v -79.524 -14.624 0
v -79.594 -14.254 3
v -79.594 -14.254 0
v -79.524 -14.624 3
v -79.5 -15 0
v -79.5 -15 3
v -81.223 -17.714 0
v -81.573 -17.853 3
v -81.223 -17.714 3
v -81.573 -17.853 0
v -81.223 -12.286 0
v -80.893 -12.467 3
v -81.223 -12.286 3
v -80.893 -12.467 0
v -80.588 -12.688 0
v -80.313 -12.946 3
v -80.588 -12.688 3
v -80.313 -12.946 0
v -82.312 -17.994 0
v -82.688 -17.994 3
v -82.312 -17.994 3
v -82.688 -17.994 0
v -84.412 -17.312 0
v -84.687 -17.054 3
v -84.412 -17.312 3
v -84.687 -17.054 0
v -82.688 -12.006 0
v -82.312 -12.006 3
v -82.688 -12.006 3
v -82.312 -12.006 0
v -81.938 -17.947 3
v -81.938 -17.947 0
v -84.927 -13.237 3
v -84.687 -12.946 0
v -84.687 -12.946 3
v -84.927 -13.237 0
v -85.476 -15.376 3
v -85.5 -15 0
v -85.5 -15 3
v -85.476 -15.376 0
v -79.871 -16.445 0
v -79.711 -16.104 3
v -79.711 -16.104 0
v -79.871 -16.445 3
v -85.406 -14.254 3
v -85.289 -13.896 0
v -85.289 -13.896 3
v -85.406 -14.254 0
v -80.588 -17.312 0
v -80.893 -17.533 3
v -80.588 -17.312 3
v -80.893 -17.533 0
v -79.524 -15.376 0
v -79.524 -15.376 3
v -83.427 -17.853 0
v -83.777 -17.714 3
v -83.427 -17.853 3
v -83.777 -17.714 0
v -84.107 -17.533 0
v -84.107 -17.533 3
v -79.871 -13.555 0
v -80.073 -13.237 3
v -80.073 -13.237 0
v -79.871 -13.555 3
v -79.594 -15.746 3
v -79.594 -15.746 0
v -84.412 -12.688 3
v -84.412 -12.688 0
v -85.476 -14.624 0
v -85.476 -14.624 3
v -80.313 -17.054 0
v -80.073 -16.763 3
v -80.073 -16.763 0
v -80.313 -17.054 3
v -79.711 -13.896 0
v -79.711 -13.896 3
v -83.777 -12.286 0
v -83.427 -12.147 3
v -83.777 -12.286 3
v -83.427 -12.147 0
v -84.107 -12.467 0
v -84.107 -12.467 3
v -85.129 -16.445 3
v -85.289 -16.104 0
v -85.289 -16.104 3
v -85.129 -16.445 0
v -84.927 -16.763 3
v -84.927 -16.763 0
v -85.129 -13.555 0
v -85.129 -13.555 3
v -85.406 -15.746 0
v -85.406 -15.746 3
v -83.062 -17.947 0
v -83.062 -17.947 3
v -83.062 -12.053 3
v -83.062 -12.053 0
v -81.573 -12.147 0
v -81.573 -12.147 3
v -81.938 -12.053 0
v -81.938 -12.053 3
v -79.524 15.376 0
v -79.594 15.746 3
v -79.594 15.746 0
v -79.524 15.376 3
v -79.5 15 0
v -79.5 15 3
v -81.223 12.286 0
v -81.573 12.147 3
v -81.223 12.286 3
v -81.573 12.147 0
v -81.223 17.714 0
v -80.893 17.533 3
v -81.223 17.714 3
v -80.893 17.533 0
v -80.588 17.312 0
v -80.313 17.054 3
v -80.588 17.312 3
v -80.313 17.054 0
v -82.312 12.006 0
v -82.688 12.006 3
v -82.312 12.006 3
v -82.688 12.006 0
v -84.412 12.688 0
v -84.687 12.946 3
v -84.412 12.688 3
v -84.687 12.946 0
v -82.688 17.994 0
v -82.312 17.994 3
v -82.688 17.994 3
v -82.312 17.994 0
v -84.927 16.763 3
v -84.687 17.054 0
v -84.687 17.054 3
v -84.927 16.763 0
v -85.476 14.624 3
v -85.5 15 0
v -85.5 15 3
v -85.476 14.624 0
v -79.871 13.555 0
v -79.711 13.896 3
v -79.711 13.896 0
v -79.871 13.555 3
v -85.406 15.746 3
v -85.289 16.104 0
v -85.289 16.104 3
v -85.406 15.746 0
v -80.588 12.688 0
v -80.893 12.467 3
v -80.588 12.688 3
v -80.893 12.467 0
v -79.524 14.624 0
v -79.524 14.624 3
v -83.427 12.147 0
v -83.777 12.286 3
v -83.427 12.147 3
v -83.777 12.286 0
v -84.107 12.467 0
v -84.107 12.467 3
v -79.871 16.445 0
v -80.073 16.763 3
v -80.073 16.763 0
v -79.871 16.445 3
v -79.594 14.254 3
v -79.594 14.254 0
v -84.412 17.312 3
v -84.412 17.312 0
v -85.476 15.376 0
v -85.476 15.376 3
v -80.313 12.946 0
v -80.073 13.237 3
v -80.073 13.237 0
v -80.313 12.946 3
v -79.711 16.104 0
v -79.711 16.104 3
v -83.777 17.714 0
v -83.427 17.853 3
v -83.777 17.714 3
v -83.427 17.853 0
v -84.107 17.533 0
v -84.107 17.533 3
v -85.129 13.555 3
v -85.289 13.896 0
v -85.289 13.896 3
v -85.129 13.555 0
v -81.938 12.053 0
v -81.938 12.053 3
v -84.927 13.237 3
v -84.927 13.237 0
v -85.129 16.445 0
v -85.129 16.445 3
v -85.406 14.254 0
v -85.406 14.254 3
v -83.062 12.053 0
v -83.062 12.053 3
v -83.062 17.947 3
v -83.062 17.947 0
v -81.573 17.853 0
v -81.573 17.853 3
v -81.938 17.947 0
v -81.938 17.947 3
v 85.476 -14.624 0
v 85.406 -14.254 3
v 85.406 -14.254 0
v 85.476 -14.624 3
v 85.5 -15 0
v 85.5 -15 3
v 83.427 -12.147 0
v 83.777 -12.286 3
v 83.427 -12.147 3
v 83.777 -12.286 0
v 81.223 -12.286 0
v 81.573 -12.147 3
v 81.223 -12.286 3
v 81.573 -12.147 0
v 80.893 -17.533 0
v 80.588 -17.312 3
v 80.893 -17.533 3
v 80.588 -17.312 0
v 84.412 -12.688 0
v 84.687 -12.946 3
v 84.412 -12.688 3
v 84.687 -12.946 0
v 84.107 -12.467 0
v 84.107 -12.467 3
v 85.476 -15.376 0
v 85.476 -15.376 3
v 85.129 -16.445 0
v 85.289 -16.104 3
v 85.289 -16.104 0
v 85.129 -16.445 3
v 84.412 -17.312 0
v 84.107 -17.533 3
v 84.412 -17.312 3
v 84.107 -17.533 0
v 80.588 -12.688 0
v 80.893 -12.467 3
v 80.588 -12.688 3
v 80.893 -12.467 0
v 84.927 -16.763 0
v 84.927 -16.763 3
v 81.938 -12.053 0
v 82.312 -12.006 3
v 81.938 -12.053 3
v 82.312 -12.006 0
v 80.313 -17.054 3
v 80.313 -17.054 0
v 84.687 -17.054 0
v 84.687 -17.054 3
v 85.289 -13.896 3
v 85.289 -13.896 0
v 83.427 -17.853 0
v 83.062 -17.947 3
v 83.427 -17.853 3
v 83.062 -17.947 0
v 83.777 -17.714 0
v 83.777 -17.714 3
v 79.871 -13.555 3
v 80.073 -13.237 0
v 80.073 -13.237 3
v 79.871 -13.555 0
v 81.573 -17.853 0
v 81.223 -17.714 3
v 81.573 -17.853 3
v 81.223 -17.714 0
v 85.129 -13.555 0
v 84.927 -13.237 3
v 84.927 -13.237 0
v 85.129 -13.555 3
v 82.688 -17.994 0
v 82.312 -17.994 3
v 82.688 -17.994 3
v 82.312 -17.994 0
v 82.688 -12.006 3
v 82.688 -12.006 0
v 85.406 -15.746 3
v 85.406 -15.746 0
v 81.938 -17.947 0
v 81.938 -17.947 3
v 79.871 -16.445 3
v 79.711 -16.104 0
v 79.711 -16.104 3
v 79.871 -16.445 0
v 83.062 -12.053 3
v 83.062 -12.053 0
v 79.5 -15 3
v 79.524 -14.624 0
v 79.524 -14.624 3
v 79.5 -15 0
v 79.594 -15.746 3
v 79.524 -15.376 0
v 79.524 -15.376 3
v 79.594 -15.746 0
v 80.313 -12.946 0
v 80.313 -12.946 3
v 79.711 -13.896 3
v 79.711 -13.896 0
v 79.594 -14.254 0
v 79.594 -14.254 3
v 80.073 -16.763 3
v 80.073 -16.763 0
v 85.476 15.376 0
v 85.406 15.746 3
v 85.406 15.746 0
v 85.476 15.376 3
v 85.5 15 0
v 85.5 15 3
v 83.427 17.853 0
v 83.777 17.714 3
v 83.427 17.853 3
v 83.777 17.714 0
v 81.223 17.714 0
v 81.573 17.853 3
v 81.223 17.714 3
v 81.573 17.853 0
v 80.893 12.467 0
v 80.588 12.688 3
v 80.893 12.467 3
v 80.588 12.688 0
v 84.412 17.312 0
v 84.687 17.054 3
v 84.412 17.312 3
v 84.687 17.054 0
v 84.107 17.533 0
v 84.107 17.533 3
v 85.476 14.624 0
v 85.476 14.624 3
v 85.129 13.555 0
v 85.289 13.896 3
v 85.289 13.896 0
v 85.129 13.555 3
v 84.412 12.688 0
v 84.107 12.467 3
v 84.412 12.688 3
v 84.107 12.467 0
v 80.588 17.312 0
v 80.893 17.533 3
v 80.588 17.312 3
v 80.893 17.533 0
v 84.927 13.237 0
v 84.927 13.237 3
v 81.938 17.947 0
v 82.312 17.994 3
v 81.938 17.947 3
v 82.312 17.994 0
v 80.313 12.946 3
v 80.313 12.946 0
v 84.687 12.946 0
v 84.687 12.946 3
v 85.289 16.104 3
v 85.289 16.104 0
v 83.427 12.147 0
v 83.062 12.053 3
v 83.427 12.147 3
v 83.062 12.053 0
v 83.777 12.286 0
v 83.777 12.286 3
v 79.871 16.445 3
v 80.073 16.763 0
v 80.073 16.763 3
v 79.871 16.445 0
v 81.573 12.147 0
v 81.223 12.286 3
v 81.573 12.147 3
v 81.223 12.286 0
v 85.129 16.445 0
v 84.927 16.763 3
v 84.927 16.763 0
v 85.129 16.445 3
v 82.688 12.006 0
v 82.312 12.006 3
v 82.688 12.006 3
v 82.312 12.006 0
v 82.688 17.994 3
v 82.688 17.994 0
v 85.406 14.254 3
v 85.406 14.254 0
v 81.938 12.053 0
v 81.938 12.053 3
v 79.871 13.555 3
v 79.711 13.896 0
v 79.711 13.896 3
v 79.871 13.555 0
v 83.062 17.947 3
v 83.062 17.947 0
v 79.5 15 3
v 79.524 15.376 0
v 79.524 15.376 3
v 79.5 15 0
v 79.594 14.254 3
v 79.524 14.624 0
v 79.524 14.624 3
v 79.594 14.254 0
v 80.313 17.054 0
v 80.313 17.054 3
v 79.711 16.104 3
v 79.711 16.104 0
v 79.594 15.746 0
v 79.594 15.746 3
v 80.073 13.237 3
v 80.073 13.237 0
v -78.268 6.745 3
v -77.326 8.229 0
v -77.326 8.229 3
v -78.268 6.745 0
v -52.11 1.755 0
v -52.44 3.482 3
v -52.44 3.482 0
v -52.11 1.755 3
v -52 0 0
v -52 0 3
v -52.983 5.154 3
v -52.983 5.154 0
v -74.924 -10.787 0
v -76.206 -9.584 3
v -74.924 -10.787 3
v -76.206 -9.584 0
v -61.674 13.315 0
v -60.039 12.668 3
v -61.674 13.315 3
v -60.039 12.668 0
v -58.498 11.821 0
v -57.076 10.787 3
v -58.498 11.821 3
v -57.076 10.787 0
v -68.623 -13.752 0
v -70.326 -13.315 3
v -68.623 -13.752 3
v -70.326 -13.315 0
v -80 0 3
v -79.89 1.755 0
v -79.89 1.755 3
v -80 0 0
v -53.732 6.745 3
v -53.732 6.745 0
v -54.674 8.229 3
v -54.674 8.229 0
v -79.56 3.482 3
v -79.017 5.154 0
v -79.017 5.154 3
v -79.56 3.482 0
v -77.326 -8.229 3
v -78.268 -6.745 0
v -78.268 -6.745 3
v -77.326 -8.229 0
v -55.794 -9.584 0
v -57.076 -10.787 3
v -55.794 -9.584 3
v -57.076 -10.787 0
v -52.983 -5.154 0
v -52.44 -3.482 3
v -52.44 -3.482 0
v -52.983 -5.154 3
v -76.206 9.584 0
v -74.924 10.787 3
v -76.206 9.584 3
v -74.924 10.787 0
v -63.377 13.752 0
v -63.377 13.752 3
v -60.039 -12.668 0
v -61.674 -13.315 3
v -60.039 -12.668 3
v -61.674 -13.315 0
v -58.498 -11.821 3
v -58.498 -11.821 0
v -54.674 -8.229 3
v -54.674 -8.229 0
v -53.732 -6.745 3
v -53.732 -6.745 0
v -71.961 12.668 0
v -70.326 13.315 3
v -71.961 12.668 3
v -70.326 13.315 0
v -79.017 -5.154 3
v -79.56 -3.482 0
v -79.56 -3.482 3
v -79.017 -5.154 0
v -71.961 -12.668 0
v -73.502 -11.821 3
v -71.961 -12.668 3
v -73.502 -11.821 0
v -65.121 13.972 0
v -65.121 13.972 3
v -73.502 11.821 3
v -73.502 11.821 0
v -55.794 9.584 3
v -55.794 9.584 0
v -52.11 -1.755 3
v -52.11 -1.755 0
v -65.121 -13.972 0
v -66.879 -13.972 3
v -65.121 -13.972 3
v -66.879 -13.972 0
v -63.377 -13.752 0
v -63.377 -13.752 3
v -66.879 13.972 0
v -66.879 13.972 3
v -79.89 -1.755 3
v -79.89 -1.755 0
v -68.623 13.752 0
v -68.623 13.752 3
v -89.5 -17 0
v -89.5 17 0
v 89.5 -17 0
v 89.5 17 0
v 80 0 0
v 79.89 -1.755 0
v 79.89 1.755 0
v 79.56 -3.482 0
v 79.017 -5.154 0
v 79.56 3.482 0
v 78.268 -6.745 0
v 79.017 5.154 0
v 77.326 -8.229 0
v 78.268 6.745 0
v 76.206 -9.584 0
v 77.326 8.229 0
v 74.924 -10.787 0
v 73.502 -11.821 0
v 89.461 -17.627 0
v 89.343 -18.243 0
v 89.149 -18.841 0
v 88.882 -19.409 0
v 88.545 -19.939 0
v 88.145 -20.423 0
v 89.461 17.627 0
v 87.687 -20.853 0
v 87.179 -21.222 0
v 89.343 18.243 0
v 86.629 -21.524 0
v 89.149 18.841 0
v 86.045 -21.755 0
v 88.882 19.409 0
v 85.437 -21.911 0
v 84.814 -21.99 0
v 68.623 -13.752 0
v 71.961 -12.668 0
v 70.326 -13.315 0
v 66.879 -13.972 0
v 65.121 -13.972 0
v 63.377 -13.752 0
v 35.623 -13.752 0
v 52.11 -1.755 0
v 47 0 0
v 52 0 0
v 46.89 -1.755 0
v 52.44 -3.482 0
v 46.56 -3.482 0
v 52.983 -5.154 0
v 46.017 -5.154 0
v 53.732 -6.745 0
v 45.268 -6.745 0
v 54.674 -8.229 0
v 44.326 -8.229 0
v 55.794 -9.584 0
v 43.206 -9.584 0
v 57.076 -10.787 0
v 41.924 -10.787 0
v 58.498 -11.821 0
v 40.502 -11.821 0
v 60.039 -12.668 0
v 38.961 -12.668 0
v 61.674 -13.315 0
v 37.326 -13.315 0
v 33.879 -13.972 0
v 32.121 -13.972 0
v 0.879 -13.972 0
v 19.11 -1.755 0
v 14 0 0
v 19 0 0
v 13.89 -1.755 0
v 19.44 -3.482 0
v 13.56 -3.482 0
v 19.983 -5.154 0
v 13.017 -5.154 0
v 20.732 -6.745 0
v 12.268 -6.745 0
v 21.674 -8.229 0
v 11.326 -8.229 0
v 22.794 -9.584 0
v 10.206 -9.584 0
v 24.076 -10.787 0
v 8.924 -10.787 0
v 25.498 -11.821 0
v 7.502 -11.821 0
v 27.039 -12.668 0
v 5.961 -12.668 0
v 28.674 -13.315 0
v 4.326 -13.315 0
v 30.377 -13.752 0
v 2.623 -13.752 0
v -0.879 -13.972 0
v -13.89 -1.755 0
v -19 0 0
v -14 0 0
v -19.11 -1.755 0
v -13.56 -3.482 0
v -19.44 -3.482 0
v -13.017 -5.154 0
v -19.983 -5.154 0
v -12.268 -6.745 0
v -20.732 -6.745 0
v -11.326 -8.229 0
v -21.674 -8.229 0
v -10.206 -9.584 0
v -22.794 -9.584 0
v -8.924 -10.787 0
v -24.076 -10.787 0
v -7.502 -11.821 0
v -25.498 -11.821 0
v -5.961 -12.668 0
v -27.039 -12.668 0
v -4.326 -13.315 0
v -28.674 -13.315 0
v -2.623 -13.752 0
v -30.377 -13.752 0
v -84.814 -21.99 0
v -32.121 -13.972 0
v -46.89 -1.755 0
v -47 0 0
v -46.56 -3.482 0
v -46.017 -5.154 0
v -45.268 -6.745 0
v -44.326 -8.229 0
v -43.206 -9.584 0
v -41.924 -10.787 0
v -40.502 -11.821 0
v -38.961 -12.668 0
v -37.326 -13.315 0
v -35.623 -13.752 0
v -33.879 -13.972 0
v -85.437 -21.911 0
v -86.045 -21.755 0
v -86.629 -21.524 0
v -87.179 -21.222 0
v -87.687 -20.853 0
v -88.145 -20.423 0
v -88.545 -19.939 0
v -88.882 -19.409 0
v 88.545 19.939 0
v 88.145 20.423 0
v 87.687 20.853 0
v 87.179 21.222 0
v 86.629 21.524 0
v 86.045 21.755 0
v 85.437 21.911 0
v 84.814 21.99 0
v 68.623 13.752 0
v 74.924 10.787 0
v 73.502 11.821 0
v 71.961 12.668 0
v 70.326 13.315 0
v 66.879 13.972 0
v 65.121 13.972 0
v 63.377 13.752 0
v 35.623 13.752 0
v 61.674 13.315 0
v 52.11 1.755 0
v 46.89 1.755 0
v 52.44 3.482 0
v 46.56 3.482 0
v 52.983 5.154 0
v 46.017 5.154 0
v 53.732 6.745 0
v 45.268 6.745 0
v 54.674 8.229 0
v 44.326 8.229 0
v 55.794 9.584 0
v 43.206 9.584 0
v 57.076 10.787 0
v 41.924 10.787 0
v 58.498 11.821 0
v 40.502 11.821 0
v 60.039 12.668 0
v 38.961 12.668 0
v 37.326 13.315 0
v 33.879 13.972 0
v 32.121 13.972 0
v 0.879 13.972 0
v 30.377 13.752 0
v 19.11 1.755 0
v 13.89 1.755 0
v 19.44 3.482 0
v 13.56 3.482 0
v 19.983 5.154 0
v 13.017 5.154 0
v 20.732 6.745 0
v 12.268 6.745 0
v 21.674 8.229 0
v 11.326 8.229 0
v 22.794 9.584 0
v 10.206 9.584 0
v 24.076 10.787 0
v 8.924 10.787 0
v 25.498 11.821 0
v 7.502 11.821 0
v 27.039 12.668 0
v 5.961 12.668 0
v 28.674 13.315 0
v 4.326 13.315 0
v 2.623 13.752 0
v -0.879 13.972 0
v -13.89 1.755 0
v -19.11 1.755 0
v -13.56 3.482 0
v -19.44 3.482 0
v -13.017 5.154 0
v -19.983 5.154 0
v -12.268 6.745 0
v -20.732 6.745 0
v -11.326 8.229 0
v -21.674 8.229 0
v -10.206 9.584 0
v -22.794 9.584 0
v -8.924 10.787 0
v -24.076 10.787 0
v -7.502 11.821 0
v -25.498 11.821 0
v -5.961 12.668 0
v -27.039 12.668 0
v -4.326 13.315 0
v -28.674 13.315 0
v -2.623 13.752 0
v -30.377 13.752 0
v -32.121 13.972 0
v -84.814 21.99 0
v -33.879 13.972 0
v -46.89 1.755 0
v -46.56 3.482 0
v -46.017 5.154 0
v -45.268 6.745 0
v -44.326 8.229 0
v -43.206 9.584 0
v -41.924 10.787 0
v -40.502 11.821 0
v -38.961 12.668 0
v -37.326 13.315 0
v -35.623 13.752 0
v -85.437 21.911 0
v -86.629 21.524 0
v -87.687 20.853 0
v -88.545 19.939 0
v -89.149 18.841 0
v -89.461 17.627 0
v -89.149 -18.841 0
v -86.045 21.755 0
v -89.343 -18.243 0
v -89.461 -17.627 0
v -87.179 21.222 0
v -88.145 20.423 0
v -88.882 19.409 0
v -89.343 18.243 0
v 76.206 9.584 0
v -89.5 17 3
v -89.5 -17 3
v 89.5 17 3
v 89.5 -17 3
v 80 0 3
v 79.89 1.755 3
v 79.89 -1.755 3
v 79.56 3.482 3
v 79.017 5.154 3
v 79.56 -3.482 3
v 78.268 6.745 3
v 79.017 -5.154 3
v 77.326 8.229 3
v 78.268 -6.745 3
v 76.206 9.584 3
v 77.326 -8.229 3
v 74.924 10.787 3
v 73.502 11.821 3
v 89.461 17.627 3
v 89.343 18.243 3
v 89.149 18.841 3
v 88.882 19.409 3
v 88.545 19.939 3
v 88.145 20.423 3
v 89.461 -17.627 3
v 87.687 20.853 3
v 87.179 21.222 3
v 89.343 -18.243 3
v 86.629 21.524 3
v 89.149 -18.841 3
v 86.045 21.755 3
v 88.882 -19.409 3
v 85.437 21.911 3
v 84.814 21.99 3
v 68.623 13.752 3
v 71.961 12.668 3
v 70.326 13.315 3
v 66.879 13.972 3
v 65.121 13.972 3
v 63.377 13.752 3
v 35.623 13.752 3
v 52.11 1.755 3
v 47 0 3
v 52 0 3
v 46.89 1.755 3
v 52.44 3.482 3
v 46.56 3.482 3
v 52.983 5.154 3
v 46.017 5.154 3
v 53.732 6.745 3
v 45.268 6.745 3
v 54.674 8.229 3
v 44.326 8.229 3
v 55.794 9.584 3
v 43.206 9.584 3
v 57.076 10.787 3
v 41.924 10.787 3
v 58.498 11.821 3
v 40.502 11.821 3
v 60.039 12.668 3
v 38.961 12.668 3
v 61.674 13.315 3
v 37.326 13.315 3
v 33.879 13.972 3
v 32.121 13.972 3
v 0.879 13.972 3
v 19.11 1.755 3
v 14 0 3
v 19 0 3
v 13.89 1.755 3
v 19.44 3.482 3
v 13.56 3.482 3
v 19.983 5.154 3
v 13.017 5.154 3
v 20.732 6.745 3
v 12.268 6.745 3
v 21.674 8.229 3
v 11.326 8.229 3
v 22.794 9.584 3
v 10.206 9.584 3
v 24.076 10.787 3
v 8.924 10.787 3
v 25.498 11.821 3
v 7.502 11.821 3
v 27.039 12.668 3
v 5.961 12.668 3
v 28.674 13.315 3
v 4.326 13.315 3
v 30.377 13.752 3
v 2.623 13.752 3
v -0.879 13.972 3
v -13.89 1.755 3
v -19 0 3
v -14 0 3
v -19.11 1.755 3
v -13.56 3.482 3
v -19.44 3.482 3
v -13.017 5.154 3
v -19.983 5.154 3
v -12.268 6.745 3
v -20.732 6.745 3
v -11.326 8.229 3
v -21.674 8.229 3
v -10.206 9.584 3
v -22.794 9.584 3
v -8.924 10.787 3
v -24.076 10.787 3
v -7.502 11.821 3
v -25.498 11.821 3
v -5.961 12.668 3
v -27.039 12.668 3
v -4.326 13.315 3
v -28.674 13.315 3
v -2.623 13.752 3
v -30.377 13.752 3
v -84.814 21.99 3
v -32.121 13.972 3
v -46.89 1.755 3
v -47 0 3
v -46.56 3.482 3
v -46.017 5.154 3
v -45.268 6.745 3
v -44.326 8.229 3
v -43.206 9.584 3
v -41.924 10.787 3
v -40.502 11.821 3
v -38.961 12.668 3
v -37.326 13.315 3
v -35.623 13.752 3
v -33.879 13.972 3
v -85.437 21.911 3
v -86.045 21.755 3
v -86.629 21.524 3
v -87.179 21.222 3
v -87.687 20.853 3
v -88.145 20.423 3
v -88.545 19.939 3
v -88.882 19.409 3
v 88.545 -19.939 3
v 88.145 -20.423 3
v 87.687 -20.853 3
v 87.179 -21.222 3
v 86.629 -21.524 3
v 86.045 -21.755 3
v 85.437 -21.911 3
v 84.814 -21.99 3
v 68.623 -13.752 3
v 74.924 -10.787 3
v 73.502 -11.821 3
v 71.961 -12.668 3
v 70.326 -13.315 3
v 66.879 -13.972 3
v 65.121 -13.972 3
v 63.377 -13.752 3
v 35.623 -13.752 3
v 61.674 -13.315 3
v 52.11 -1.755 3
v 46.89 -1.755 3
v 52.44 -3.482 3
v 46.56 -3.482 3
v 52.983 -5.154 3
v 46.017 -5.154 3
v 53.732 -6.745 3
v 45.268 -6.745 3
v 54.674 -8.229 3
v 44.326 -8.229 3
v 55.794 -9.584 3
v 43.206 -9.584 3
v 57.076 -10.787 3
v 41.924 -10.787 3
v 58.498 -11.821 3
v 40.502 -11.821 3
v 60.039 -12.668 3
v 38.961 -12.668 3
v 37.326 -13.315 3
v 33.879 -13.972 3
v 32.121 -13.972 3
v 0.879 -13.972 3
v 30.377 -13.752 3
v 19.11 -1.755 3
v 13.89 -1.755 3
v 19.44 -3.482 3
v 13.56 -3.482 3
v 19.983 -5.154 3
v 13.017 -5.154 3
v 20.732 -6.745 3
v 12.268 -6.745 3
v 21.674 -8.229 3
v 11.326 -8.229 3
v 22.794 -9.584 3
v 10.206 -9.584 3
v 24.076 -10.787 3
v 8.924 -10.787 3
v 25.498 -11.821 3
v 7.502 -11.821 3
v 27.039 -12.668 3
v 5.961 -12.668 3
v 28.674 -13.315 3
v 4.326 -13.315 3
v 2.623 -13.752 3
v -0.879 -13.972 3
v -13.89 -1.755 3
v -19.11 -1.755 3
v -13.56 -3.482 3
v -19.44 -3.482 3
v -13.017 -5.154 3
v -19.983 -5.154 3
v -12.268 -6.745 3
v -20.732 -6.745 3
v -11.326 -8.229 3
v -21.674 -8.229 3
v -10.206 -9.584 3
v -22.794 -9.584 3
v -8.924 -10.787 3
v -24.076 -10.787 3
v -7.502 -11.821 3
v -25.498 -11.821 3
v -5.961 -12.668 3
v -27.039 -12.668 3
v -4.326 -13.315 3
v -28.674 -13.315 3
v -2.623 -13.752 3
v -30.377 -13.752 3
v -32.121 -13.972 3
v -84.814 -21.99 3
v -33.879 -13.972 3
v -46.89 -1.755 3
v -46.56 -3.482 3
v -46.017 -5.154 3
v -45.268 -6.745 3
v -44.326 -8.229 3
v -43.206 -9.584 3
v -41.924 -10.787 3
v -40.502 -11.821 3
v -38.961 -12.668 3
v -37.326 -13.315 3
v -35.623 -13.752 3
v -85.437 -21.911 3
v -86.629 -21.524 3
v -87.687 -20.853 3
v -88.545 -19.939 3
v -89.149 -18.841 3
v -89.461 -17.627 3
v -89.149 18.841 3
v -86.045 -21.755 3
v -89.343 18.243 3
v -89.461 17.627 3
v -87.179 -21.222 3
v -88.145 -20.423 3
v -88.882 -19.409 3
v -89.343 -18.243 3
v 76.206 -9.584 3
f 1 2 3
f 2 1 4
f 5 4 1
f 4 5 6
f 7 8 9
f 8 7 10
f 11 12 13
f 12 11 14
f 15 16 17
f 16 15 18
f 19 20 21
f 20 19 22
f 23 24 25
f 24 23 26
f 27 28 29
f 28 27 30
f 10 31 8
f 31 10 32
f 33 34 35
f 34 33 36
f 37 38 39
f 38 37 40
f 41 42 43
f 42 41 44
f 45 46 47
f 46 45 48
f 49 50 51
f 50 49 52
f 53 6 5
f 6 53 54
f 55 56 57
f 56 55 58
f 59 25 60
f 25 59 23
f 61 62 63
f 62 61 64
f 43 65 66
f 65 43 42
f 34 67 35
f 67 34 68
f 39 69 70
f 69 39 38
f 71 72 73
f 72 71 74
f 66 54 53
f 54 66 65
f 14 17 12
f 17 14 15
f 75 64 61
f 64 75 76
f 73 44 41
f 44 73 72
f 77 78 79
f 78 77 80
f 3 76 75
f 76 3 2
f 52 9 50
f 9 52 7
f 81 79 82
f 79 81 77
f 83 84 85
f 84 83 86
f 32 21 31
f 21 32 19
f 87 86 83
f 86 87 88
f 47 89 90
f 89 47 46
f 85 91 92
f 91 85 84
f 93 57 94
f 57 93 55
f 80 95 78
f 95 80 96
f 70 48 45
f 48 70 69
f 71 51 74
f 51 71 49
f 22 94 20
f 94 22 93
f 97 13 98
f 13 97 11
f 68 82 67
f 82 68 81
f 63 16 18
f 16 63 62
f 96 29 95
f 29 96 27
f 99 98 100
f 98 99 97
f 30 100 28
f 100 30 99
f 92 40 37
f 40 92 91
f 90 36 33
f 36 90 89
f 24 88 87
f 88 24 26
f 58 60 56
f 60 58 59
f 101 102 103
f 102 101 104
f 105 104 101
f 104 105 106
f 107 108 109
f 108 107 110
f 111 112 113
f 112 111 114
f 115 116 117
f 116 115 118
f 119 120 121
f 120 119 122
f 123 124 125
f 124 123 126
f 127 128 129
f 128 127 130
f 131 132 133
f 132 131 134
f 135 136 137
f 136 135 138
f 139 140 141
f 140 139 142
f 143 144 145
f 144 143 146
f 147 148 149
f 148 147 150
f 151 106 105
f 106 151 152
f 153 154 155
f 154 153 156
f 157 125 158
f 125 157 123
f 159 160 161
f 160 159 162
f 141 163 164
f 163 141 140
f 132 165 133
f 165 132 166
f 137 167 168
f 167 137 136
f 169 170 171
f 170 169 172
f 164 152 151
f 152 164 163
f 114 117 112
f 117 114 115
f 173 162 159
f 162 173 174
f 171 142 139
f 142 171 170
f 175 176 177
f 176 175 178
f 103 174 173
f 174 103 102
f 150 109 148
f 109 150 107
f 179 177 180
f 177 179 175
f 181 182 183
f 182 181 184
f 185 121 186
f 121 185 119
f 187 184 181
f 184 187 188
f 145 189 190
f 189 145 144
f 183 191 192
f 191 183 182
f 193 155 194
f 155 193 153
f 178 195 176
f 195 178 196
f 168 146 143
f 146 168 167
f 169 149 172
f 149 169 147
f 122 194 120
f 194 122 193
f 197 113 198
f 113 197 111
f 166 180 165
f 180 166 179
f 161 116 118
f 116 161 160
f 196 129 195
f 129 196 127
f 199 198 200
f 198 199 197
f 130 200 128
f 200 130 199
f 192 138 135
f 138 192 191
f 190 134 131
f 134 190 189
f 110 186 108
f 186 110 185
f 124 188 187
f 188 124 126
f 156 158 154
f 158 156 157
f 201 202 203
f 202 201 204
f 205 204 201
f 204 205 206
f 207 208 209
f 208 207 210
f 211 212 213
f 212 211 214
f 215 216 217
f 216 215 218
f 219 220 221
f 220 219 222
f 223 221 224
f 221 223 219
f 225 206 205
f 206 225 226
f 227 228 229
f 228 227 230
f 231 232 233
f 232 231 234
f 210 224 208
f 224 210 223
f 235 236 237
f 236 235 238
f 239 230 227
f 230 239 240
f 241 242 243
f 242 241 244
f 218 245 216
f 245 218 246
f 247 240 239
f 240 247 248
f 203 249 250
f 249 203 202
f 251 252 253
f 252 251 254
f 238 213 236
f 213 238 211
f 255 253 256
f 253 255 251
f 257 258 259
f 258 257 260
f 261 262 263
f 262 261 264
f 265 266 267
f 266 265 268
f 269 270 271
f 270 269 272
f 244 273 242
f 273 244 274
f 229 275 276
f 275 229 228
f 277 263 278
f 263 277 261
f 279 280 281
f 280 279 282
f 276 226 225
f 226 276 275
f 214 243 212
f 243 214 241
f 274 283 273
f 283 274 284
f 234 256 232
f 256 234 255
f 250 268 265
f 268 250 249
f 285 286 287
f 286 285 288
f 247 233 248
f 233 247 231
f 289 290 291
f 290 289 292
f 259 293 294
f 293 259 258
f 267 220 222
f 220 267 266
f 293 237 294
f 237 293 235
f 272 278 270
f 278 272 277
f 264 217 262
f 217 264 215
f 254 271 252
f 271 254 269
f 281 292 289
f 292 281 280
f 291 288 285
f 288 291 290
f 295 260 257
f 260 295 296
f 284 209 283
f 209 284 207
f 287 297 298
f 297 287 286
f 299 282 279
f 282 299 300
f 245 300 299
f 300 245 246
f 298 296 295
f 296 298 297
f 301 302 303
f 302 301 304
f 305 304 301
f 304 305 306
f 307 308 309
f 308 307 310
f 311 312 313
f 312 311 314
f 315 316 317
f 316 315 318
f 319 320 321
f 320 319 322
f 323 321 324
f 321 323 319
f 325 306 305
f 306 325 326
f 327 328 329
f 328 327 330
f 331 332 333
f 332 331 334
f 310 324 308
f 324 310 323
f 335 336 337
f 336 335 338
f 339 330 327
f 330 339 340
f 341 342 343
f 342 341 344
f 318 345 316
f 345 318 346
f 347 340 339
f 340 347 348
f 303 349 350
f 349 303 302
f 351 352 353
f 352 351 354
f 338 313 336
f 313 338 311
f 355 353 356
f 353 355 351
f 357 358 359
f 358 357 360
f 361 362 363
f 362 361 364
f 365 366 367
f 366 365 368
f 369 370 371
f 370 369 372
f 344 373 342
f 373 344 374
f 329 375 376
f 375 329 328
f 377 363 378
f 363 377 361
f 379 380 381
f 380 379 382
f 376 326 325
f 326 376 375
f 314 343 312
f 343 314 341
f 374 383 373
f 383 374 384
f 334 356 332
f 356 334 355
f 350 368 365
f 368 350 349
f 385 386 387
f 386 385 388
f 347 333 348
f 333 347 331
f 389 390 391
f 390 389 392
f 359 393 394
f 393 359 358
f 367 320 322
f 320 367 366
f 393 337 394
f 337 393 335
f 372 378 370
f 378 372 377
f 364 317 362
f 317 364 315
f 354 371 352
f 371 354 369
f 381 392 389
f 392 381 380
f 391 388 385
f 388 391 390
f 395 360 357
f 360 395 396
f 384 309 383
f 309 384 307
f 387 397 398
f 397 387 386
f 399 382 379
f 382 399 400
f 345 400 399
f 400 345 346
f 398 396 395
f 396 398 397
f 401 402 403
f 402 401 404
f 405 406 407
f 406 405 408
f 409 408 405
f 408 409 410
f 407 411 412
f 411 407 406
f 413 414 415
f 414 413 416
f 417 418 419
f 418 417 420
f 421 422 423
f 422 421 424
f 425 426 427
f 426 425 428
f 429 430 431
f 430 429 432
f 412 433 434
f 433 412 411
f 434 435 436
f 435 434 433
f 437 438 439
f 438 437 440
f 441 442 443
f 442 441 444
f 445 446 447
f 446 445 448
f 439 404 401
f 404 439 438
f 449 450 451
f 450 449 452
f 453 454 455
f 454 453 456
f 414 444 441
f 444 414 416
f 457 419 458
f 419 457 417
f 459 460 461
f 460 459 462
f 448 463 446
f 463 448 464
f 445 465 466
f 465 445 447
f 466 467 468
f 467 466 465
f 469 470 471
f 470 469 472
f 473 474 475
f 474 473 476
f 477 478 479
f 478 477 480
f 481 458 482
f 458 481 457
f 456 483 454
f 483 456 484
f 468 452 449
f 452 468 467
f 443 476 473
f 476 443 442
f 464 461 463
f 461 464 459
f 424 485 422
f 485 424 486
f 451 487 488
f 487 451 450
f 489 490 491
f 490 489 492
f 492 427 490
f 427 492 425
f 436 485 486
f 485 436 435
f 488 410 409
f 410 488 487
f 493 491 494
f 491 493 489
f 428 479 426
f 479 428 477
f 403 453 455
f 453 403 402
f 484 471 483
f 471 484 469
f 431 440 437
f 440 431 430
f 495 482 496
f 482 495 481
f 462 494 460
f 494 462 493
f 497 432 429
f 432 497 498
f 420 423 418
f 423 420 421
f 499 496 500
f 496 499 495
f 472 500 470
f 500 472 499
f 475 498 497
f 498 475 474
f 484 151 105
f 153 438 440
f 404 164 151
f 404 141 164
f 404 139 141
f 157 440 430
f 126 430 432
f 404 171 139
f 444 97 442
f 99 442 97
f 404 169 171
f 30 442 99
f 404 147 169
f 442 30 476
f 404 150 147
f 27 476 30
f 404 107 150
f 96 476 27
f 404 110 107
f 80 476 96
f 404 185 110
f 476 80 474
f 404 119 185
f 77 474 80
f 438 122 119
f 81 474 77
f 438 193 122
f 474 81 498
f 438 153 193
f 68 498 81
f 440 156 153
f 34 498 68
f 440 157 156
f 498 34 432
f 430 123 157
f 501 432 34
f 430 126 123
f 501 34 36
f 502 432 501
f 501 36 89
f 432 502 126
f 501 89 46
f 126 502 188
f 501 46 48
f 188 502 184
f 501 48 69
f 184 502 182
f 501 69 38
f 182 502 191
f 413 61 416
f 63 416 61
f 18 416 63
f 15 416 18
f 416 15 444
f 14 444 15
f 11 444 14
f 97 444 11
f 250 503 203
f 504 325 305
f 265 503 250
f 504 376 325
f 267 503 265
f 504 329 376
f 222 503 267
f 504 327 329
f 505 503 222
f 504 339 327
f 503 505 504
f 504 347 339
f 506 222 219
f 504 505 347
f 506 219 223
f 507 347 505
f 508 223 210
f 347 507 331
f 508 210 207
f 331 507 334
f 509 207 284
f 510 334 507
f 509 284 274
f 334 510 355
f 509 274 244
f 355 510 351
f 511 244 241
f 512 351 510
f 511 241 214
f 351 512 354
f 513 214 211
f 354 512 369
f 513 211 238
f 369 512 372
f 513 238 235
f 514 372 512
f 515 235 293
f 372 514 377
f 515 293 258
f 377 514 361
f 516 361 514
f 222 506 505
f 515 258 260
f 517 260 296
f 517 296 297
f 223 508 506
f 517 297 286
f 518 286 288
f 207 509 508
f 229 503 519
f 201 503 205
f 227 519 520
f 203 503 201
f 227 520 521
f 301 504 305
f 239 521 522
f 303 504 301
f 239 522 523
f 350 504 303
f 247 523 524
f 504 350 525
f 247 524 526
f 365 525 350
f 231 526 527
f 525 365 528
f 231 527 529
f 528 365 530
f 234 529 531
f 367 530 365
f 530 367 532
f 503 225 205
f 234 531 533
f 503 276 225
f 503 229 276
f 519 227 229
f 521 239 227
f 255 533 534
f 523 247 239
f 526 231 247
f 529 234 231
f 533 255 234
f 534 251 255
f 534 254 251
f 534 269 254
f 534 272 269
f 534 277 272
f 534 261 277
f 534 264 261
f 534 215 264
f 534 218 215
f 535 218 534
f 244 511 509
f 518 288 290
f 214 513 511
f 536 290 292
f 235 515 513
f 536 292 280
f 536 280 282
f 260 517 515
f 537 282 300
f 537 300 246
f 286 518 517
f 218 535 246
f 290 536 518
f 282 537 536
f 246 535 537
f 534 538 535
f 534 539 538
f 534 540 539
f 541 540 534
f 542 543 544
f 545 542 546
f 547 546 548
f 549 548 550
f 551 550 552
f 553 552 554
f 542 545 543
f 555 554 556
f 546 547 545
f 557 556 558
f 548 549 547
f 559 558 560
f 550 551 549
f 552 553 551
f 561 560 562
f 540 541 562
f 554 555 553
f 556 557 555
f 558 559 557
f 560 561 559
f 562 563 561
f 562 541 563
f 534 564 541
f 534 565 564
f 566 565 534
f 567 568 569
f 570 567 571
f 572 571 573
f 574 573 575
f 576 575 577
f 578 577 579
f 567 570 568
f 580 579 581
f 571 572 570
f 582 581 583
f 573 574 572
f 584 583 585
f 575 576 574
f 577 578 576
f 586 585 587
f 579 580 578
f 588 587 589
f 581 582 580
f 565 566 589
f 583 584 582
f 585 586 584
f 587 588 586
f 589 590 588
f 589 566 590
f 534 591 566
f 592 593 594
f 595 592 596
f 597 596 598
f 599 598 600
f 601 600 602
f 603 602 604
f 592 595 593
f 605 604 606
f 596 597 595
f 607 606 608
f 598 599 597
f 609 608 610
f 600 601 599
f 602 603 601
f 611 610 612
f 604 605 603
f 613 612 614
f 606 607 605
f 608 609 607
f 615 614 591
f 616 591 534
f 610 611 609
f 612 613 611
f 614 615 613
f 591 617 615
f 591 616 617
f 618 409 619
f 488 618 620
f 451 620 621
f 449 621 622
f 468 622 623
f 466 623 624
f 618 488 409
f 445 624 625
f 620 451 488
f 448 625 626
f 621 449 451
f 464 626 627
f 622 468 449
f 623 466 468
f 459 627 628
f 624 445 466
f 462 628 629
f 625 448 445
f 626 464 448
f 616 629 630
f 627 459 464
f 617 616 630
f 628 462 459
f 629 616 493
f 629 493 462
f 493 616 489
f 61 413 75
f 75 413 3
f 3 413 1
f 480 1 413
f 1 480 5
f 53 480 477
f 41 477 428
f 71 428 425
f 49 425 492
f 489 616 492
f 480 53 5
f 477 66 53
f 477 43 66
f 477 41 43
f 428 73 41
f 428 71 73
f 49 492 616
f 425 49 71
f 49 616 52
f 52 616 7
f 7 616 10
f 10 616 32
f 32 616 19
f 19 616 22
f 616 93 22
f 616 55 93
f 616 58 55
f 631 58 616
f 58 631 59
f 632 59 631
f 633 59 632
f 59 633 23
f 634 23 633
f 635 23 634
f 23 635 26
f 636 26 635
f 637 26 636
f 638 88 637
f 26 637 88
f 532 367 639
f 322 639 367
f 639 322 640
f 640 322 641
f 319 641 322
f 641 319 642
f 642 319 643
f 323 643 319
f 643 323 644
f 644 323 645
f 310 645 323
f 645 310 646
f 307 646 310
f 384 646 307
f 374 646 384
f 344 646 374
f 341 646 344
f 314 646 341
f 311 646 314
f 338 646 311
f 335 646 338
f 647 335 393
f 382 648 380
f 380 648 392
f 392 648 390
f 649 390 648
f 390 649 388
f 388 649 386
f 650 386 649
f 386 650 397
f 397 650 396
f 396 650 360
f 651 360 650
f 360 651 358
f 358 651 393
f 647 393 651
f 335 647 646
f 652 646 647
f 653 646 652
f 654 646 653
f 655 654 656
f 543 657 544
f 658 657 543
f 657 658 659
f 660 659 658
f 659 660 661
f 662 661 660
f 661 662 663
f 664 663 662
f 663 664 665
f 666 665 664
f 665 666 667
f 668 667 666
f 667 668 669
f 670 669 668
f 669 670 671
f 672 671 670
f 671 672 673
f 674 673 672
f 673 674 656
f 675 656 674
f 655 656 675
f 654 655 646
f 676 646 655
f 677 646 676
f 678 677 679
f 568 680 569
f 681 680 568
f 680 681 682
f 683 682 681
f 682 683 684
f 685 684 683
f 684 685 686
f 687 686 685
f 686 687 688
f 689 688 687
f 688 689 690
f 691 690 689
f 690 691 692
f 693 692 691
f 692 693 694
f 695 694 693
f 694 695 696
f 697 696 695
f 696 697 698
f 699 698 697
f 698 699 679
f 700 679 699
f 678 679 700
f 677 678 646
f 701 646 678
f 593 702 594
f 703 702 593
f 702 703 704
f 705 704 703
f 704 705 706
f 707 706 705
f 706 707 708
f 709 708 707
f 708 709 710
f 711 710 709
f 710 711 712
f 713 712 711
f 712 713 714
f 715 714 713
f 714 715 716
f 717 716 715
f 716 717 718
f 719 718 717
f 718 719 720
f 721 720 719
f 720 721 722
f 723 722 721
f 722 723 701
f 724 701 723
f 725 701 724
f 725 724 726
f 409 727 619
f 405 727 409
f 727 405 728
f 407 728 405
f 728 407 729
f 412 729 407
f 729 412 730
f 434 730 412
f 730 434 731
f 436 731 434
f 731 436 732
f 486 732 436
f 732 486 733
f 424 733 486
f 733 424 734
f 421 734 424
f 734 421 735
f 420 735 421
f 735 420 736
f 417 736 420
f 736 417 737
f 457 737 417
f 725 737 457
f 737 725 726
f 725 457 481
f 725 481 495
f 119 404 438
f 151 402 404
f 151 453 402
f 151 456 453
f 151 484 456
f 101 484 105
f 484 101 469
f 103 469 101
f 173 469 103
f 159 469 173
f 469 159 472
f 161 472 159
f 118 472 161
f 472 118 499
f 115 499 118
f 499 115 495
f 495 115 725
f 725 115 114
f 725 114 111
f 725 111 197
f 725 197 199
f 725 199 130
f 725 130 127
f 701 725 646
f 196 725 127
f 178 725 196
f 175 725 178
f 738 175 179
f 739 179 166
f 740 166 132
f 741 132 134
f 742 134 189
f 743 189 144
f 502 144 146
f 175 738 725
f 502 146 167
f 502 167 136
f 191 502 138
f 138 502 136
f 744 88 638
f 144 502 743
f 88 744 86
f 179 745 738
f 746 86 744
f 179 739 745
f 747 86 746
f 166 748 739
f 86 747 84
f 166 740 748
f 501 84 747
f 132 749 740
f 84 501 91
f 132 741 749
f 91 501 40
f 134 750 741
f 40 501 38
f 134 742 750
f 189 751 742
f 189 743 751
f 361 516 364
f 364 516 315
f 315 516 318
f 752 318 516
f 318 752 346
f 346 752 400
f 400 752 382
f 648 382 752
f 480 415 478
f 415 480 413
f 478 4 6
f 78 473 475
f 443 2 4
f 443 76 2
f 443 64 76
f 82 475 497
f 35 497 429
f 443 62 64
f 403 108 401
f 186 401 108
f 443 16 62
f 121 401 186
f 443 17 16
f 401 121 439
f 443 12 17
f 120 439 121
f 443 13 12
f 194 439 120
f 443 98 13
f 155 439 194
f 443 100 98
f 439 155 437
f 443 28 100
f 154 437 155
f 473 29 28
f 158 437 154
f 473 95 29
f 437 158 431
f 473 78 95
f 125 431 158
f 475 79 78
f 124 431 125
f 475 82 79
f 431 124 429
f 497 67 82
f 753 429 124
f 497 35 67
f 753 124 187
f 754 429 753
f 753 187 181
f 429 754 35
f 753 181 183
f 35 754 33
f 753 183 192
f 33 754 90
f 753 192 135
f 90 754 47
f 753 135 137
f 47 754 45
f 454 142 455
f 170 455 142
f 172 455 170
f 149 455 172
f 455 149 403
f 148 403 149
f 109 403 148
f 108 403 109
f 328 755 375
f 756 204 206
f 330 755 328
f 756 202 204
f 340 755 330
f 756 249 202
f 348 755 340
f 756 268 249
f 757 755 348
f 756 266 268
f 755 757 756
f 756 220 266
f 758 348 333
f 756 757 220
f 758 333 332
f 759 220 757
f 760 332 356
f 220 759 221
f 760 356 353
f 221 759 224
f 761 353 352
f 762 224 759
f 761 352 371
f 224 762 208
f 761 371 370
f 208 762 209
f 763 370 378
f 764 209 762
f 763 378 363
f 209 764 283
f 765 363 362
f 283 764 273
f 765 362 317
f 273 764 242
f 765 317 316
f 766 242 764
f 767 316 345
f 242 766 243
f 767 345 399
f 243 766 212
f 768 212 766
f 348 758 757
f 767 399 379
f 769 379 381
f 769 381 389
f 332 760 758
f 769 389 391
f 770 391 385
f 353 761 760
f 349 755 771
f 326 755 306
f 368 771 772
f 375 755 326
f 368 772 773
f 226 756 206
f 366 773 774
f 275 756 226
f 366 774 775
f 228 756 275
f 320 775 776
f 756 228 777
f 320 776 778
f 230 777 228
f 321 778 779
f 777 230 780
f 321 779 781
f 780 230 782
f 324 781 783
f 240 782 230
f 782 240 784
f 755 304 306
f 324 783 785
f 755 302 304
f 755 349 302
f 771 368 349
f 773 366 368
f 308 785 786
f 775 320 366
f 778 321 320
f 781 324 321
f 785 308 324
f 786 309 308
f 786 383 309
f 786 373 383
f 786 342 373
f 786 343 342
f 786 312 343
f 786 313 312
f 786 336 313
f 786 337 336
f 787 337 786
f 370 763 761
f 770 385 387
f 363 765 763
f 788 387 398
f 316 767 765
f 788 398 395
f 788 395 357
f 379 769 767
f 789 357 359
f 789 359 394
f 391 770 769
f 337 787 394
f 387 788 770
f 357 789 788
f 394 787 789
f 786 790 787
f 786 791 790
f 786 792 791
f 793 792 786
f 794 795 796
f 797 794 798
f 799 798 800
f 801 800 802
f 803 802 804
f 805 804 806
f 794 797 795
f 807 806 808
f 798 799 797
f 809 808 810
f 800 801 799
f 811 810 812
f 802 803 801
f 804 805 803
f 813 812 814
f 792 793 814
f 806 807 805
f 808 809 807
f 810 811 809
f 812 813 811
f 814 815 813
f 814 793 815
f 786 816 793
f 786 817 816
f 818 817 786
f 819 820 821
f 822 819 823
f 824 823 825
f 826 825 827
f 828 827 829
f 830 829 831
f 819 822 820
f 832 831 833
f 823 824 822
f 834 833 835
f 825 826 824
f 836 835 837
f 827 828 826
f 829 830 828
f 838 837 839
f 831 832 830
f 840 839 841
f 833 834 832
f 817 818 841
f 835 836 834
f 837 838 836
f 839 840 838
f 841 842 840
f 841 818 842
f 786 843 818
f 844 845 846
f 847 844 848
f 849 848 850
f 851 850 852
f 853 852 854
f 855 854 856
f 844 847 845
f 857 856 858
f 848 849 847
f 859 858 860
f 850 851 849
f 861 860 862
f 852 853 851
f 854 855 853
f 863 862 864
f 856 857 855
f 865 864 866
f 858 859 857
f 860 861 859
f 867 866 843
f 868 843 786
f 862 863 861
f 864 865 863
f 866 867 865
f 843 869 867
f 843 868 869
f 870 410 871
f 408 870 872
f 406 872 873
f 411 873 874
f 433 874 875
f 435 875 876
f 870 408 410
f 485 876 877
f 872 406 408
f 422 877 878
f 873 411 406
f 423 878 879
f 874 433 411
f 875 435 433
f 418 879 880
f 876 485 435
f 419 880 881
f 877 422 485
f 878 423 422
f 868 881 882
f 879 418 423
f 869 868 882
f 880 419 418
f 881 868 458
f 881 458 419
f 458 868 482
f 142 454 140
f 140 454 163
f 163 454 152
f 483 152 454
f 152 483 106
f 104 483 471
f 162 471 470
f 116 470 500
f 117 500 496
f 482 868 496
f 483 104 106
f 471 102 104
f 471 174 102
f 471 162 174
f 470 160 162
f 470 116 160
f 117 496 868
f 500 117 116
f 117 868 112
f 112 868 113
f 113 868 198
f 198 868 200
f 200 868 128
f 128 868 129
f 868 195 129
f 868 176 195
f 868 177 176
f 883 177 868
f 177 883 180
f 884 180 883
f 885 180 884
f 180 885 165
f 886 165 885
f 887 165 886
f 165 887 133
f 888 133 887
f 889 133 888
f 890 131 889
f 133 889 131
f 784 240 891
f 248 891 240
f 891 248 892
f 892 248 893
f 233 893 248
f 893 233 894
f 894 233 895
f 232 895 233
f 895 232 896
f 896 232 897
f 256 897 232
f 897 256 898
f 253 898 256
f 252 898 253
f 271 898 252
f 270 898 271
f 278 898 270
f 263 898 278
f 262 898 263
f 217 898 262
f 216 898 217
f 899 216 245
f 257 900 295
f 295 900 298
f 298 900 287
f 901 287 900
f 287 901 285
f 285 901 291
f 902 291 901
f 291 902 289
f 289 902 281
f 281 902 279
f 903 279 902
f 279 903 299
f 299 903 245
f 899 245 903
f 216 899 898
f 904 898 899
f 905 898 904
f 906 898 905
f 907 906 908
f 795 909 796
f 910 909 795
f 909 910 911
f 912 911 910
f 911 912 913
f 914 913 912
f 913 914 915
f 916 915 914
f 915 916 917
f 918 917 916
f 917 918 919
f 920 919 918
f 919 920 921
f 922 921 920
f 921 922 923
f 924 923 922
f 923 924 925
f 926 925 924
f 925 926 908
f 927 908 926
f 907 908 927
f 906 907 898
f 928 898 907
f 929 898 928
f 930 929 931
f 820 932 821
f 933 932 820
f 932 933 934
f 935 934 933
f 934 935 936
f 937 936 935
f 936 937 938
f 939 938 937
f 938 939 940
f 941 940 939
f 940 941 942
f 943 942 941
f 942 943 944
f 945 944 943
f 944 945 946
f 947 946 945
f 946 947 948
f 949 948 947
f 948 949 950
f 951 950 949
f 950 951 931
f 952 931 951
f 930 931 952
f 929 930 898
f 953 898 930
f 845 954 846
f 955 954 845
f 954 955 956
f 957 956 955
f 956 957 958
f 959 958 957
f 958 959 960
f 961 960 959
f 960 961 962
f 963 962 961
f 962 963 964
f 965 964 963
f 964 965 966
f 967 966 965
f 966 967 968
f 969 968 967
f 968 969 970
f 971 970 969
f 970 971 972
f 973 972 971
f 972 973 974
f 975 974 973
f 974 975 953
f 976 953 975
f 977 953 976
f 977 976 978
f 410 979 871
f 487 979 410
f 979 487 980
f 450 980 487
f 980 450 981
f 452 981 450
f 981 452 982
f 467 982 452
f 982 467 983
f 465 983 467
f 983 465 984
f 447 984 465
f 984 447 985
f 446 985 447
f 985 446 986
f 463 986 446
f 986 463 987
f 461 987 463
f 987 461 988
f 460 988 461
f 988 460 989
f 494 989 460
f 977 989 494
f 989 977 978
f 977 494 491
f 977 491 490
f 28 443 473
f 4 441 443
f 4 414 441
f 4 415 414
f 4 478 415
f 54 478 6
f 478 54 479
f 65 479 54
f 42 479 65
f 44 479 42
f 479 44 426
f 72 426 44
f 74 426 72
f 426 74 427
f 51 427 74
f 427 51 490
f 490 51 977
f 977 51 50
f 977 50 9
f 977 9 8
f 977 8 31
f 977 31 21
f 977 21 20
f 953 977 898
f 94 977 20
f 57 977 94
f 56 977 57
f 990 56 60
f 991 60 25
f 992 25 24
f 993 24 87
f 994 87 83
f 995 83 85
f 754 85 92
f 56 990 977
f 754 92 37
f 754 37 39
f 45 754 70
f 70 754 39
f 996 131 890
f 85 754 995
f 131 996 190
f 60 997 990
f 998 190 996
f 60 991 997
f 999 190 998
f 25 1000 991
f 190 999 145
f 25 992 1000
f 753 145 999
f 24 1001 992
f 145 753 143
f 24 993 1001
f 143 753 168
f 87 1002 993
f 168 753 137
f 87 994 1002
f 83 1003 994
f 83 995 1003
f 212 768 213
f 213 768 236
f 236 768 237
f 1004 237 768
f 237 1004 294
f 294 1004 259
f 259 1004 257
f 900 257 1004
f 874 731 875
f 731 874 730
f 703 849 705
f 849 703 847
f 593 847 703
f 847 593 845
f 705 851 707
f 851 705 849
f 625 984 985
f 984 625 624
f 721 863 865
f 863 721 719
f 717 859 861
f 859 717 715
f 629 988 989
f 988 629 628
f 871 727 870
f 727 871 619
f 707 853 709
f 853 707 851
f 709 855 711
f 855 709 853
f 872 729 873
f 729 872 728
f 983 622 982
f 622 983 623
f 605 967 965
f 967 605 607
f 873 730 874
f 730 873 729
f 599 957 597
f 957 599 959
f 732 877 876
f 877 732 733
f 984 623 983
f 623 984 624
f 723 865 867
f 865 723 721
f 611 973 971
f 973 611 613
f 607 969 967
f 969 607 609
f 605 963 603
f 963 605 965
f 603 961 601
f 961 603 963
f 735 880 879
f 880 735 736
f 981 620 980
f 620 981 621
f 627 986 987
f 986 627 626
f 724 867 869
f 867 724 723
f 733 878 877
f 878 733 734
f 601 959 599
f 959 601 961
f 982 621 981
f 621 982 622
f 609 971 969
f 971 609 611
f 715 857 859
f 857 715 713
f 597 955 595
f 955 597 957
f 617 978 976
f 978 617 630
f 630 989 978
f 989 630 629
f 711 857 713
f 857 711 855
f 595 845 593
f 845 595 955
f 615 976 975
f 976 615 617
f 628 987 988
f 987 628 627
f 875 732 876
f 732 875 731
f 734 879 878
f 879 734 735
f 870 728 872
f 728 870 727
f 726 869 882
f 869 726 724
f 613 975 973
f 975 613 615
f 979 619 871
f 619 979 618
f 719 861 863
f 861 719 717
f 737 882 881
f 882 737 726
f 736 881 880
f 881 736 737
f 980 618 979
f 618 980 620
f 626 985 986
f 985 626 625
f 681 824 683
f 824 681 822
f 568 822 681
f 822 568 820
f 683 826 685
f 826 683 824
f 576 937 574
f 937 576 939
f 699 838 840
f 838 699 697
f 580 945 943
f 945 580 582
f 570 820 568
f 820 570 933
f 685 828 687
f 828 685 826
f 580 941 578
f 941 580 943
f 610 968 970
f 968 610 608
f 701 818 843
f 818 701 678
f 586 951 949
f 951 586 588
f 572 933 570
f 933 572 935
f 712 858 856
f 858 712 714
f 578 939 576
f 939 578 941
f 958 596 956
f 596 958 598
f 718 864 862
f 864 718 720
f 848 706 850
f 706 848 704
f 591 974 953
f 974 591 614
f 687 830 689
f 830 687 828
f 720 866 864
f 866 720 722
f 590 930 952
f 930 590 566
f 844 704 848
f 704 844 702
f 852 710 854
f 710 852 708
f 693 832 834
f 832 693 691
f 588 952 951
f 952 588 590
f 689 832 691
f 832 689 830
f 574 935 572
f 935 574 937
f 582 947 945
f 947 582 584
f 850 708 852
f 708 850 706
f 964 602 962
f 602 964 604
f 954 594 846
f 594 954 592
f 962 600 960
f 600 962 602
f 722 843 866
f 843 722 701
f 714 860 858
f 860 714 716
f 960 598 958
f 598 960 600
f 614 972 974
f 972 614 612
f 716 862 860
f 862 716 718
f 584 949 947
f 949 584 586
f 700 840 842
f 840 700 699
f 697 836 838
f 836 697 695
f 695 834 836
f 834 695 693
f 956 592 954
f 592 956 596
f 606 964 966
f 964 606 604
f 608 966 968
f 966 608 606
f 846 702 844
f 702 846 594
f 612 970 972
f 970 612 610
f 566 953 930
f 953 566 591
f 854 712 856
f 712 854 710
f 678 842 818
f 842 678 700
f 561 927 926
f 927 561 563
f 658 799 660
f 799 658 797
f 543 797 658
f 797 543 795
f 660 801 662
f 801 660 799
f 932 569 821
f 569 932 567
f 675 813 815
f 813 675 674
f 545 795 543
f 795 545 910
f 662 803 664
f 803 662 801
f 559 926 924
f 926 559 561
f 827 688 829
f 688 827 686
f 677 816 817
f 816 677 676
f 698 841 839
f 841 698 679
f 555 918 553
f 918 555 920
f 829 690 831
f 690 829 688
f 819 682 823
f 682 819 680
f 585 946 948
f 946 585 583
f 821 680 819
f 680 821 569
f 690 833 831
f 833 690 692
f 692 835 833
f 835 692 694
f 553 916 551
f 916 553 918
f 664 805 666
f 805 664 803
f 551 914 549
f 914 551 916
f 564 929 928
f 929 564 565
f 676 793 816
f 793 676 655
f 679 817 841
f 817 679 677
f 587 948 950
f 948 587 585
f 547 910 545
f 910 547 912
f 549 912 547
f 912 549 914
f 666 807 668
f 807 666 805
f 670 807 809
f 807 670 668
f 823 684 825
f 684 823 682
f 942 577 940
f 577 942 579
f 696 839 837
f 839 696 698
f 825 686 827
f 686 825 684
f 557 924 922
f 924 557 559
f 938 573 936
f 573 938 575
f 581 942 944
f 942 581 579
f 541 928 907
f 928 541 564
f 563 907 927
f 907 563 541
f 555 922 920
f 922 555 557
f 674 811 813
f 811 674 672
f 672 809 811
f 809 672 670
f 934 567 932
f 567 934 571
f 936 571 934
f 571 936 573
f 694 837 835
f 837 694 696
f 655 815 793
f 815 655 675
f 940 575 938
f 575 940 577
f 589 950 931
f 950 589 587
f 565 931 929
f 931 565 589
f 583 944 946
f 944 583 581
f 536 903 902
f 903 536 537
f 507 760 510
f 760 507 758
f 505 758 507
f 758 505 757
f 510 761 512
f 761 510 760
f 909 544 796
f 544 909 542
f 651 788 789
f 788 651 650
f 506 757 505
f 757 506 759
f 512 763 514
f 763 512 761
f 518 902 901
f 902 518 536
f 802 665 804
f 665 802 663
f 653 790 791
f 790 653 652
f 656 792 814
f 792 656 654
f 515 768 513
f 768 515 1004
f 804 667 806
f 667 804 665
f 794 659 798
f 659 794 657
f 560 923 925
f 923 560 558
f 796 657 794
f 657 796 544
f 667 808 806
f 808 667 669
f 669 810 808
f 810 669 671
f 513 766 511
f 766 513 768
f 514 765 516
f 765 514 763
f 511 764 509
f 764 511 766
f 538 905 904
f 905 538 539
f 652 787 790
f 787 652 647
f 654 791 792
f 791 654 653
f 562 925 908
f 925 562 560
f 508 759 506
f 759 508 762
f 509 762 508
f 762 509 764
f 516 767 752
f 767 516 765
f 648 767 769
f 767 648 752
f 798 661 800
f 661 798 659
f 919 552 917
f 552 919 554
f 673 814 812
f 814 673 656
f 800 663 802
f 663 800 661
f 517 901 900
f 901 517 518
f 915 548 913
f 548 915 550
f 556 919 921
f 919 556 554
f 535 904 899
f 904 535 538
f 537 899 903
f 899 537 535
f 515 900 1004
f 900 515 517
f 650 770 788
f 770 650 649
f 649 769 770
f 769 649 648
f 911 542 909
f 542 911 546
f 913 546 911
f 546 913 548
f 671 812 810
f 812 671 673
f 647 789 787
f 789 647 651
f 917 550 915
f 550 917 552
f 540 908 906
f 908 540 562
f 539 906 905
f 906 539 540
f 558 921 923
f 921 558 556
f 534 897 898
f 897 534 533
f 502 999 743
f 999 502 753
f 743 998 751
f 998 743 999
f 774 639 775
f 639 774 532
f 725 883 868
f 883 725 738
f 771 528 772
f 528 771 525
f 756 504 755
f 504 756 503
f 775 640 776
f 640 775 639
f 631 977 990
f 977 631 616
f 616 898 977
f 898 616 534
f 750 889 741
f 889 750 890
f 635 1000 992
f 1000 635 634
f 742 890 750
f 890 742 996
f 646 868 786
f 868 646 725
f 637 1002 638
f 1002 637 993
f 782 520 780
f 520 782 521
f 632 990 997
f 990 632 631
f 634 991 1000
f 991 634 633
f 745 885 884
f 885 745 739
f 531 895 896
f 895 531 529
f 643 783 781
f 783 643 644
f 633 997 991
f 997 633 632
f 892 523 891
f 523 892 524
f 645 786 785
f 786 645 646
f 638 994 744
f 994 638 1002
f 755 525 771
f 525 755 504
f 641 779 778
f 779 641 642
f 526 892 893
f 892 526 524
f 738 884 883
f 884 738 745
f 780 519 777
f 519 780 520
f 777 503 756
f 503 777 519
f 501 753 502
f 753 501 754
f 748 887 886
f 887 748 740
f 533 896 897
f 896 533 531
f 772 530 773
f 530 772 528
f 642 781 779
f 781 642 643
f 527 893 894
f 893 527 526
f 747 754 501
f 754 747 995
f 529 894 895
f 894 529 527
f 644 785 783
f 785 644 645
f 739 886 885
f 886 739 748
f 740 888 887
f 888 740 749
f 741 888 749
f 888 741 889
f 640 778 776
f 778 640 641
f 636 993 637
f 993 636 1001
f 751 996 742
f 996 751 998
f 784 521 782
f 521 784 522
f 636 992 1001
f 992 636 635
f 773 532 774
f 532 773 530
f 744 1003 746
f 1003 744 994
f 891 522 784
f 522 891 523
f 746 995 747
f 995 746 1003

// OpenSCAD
$fn = 50;


difference() {
	union() {
		hull() {
			translate(v = [-84.5000000000, 17.0000000000, 0]) {
				cylinder(h = 3, r = 5);
			}
			translate(v = [84.5000000000, 17.0000000000, 0]) {
				cylinder(h = 3, r = 5);
			}
			translate(v = [-84.5000000000, -17.0000000000, 0]) {
				cylinder(h = 3, r = 5);
			}
			translate(v = [84.5000000000, -17.0000000000, 0]) {
				cylinder(h = 3, r = 5);
			}
		}
	}
	union() {
		#translate(v = [-82.5000000000, -15.0000000000, -100.0000000000]) {
			cylinder(h = 200, r = 3.0000000000);
		}
		#translate(v = [-82.5000000000, 15.0000000000, -100.0000000000]) {
			cylinder(h = 200, r = 3.0000000000);
		}
		#translate(v = [82.5000000000, -15.0000000000, -100.0000000000]) {
			cylinder(h = 200, r = 3.0000000000);
		}
		#translate(v = [82.5000000000, 15.0000000000, -100.0000000000]) {
			cylinder(h = 200, r = 3.0000000000);
		}
		#translate(v = [-66.0000000000, 0, 0]) {
			cylinder(h = 3, r = 14.0000000000);
		}
		#translate(v = [-33.0000000000, 0, 0]) {
			cylinder(h = 3, r = 14.0000000000);
		}
		#cylinder(h = 3, r = 14.0000000000);
		#translate(v = [33.0000000000, 0, 0]) {
			cylinder(h = 3, r = 14.0000000000);
		}
		#translate(v = [66.0000000000, 0, 0]) {
			cylinder(h = 3, r = 14.0000000000);
		}
	}
}
